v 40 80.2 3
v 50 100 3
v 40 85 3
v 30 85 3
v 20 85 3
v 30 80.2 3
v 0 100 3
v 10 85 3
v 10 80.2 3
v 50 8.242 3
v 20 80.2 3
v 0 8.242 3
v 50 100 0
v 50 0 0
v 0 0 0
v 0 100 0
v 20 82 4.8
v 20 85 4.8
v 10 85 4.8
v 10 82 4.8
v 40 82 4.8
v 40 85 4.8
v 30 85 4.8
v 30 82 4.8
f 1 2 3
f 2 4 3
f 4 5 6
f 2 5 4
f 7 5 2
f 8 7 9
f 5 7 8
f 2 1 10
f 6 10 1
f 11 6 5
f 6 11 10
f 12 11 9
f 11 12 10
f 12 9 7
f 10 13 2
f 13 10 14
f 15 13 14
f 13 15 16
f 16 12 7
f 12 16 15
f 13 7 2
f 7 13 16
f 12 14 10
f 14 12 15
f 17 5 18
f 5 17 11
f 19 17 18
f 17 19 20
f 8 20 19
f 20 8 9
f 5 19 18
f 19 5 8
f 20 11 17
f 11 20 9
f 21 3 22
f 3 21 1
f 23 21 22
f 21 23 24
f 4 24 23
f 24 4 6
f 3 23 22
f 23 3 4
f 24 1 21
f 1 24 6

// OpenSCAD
//
// ktCAR2
//

gap1 = 0.001;
gap2 = 0.002;
h = 3;
l = 100;
w = 50;


translate( [w*0, 0, 0] ) base();
/*translate( [w*1, 0, 0] ) base();
translate( [w*2, 0, 0] ) base();
translate( [w*3, 0, 0] ) base();
translate( [w*4, 0, 0] ) base();*/


translate( [w*0, 0, 0] ) line();
/*translate( [w*1, 0, 0] ) line();
translate( [w*2, 0, 0] ) line();
translate( [w*3, 0, 0] ) line();
translate( [w*4, 0, 0] ) line();*/
module base()
{
    color( "Gray" ) difference()
    {
        cube( [w, l, h] );
        translate( [0, 0, 0] ) rotate( [20, 0, 0] ) cube( [w, 30, h] );
        line();
    }
}

module line()
{
    color( "White" ) translate( [3, 16+6, h-1] )
    {
        cube( [3, 73-6, 1] );
        translate( [-6+3, 0, 0] )
        {
            difference()
            {
                cylinder( r=6, h=1, $fn=50 );
                cylinder( r=3, h=1, $fn=50 );
                translate( [-7, 0, 0] ) cube( [14, 14, 1] );
                translate( [-14+0.5, -7, 0] ) cube( [14, 14, 1] );
            }
        }
    }
    color( "White" ) translate( [w-3-3, 16+6, h-1] ) 
    {
        cube( [3, 73-6, 1] );
        translate( [6, 0, 0] )
        {
            difference()
            {
                cylinder( r=6, h=1, $fn=50 );
                cylinder( r=3, h=1, $fn=50 );
                translate( [-3, 0, 0] ) cube( [14, 14, 1] );
                translate( [-0.5, -7, 0] ) cube( [14, 14, 1] );
            }
        }
    }

    color( "White" ) difference()
    {
        translate( [10, 82, h] )
        {
            union()
            {
                cube( [10, 3, 1.8] );
                translate( [0, -1.8, 0] ) rotate( [-45, 0, 0]) cube( [10, 3, 1.8*sqrt(2)] );
            }
        }
        translate( [10-2, 82-4, h-4] ) cube( [14, 10, 4] );
    }

    color( "White" ) difference()
    {
        translate( [w-10-10, 82, h] )
        {
            union()
            {
                cube( [10, 3, 1.8] );
                translate( [0, -1.8, 0] ) rotate( [-45, 0, 0]) cube( [10, 3, 1.8*sqrt(2)] );
            }
        }
        translate( [w-10-10-2, 82-4, h-4] ) cube( [14, 10, 4] );
    }
}
